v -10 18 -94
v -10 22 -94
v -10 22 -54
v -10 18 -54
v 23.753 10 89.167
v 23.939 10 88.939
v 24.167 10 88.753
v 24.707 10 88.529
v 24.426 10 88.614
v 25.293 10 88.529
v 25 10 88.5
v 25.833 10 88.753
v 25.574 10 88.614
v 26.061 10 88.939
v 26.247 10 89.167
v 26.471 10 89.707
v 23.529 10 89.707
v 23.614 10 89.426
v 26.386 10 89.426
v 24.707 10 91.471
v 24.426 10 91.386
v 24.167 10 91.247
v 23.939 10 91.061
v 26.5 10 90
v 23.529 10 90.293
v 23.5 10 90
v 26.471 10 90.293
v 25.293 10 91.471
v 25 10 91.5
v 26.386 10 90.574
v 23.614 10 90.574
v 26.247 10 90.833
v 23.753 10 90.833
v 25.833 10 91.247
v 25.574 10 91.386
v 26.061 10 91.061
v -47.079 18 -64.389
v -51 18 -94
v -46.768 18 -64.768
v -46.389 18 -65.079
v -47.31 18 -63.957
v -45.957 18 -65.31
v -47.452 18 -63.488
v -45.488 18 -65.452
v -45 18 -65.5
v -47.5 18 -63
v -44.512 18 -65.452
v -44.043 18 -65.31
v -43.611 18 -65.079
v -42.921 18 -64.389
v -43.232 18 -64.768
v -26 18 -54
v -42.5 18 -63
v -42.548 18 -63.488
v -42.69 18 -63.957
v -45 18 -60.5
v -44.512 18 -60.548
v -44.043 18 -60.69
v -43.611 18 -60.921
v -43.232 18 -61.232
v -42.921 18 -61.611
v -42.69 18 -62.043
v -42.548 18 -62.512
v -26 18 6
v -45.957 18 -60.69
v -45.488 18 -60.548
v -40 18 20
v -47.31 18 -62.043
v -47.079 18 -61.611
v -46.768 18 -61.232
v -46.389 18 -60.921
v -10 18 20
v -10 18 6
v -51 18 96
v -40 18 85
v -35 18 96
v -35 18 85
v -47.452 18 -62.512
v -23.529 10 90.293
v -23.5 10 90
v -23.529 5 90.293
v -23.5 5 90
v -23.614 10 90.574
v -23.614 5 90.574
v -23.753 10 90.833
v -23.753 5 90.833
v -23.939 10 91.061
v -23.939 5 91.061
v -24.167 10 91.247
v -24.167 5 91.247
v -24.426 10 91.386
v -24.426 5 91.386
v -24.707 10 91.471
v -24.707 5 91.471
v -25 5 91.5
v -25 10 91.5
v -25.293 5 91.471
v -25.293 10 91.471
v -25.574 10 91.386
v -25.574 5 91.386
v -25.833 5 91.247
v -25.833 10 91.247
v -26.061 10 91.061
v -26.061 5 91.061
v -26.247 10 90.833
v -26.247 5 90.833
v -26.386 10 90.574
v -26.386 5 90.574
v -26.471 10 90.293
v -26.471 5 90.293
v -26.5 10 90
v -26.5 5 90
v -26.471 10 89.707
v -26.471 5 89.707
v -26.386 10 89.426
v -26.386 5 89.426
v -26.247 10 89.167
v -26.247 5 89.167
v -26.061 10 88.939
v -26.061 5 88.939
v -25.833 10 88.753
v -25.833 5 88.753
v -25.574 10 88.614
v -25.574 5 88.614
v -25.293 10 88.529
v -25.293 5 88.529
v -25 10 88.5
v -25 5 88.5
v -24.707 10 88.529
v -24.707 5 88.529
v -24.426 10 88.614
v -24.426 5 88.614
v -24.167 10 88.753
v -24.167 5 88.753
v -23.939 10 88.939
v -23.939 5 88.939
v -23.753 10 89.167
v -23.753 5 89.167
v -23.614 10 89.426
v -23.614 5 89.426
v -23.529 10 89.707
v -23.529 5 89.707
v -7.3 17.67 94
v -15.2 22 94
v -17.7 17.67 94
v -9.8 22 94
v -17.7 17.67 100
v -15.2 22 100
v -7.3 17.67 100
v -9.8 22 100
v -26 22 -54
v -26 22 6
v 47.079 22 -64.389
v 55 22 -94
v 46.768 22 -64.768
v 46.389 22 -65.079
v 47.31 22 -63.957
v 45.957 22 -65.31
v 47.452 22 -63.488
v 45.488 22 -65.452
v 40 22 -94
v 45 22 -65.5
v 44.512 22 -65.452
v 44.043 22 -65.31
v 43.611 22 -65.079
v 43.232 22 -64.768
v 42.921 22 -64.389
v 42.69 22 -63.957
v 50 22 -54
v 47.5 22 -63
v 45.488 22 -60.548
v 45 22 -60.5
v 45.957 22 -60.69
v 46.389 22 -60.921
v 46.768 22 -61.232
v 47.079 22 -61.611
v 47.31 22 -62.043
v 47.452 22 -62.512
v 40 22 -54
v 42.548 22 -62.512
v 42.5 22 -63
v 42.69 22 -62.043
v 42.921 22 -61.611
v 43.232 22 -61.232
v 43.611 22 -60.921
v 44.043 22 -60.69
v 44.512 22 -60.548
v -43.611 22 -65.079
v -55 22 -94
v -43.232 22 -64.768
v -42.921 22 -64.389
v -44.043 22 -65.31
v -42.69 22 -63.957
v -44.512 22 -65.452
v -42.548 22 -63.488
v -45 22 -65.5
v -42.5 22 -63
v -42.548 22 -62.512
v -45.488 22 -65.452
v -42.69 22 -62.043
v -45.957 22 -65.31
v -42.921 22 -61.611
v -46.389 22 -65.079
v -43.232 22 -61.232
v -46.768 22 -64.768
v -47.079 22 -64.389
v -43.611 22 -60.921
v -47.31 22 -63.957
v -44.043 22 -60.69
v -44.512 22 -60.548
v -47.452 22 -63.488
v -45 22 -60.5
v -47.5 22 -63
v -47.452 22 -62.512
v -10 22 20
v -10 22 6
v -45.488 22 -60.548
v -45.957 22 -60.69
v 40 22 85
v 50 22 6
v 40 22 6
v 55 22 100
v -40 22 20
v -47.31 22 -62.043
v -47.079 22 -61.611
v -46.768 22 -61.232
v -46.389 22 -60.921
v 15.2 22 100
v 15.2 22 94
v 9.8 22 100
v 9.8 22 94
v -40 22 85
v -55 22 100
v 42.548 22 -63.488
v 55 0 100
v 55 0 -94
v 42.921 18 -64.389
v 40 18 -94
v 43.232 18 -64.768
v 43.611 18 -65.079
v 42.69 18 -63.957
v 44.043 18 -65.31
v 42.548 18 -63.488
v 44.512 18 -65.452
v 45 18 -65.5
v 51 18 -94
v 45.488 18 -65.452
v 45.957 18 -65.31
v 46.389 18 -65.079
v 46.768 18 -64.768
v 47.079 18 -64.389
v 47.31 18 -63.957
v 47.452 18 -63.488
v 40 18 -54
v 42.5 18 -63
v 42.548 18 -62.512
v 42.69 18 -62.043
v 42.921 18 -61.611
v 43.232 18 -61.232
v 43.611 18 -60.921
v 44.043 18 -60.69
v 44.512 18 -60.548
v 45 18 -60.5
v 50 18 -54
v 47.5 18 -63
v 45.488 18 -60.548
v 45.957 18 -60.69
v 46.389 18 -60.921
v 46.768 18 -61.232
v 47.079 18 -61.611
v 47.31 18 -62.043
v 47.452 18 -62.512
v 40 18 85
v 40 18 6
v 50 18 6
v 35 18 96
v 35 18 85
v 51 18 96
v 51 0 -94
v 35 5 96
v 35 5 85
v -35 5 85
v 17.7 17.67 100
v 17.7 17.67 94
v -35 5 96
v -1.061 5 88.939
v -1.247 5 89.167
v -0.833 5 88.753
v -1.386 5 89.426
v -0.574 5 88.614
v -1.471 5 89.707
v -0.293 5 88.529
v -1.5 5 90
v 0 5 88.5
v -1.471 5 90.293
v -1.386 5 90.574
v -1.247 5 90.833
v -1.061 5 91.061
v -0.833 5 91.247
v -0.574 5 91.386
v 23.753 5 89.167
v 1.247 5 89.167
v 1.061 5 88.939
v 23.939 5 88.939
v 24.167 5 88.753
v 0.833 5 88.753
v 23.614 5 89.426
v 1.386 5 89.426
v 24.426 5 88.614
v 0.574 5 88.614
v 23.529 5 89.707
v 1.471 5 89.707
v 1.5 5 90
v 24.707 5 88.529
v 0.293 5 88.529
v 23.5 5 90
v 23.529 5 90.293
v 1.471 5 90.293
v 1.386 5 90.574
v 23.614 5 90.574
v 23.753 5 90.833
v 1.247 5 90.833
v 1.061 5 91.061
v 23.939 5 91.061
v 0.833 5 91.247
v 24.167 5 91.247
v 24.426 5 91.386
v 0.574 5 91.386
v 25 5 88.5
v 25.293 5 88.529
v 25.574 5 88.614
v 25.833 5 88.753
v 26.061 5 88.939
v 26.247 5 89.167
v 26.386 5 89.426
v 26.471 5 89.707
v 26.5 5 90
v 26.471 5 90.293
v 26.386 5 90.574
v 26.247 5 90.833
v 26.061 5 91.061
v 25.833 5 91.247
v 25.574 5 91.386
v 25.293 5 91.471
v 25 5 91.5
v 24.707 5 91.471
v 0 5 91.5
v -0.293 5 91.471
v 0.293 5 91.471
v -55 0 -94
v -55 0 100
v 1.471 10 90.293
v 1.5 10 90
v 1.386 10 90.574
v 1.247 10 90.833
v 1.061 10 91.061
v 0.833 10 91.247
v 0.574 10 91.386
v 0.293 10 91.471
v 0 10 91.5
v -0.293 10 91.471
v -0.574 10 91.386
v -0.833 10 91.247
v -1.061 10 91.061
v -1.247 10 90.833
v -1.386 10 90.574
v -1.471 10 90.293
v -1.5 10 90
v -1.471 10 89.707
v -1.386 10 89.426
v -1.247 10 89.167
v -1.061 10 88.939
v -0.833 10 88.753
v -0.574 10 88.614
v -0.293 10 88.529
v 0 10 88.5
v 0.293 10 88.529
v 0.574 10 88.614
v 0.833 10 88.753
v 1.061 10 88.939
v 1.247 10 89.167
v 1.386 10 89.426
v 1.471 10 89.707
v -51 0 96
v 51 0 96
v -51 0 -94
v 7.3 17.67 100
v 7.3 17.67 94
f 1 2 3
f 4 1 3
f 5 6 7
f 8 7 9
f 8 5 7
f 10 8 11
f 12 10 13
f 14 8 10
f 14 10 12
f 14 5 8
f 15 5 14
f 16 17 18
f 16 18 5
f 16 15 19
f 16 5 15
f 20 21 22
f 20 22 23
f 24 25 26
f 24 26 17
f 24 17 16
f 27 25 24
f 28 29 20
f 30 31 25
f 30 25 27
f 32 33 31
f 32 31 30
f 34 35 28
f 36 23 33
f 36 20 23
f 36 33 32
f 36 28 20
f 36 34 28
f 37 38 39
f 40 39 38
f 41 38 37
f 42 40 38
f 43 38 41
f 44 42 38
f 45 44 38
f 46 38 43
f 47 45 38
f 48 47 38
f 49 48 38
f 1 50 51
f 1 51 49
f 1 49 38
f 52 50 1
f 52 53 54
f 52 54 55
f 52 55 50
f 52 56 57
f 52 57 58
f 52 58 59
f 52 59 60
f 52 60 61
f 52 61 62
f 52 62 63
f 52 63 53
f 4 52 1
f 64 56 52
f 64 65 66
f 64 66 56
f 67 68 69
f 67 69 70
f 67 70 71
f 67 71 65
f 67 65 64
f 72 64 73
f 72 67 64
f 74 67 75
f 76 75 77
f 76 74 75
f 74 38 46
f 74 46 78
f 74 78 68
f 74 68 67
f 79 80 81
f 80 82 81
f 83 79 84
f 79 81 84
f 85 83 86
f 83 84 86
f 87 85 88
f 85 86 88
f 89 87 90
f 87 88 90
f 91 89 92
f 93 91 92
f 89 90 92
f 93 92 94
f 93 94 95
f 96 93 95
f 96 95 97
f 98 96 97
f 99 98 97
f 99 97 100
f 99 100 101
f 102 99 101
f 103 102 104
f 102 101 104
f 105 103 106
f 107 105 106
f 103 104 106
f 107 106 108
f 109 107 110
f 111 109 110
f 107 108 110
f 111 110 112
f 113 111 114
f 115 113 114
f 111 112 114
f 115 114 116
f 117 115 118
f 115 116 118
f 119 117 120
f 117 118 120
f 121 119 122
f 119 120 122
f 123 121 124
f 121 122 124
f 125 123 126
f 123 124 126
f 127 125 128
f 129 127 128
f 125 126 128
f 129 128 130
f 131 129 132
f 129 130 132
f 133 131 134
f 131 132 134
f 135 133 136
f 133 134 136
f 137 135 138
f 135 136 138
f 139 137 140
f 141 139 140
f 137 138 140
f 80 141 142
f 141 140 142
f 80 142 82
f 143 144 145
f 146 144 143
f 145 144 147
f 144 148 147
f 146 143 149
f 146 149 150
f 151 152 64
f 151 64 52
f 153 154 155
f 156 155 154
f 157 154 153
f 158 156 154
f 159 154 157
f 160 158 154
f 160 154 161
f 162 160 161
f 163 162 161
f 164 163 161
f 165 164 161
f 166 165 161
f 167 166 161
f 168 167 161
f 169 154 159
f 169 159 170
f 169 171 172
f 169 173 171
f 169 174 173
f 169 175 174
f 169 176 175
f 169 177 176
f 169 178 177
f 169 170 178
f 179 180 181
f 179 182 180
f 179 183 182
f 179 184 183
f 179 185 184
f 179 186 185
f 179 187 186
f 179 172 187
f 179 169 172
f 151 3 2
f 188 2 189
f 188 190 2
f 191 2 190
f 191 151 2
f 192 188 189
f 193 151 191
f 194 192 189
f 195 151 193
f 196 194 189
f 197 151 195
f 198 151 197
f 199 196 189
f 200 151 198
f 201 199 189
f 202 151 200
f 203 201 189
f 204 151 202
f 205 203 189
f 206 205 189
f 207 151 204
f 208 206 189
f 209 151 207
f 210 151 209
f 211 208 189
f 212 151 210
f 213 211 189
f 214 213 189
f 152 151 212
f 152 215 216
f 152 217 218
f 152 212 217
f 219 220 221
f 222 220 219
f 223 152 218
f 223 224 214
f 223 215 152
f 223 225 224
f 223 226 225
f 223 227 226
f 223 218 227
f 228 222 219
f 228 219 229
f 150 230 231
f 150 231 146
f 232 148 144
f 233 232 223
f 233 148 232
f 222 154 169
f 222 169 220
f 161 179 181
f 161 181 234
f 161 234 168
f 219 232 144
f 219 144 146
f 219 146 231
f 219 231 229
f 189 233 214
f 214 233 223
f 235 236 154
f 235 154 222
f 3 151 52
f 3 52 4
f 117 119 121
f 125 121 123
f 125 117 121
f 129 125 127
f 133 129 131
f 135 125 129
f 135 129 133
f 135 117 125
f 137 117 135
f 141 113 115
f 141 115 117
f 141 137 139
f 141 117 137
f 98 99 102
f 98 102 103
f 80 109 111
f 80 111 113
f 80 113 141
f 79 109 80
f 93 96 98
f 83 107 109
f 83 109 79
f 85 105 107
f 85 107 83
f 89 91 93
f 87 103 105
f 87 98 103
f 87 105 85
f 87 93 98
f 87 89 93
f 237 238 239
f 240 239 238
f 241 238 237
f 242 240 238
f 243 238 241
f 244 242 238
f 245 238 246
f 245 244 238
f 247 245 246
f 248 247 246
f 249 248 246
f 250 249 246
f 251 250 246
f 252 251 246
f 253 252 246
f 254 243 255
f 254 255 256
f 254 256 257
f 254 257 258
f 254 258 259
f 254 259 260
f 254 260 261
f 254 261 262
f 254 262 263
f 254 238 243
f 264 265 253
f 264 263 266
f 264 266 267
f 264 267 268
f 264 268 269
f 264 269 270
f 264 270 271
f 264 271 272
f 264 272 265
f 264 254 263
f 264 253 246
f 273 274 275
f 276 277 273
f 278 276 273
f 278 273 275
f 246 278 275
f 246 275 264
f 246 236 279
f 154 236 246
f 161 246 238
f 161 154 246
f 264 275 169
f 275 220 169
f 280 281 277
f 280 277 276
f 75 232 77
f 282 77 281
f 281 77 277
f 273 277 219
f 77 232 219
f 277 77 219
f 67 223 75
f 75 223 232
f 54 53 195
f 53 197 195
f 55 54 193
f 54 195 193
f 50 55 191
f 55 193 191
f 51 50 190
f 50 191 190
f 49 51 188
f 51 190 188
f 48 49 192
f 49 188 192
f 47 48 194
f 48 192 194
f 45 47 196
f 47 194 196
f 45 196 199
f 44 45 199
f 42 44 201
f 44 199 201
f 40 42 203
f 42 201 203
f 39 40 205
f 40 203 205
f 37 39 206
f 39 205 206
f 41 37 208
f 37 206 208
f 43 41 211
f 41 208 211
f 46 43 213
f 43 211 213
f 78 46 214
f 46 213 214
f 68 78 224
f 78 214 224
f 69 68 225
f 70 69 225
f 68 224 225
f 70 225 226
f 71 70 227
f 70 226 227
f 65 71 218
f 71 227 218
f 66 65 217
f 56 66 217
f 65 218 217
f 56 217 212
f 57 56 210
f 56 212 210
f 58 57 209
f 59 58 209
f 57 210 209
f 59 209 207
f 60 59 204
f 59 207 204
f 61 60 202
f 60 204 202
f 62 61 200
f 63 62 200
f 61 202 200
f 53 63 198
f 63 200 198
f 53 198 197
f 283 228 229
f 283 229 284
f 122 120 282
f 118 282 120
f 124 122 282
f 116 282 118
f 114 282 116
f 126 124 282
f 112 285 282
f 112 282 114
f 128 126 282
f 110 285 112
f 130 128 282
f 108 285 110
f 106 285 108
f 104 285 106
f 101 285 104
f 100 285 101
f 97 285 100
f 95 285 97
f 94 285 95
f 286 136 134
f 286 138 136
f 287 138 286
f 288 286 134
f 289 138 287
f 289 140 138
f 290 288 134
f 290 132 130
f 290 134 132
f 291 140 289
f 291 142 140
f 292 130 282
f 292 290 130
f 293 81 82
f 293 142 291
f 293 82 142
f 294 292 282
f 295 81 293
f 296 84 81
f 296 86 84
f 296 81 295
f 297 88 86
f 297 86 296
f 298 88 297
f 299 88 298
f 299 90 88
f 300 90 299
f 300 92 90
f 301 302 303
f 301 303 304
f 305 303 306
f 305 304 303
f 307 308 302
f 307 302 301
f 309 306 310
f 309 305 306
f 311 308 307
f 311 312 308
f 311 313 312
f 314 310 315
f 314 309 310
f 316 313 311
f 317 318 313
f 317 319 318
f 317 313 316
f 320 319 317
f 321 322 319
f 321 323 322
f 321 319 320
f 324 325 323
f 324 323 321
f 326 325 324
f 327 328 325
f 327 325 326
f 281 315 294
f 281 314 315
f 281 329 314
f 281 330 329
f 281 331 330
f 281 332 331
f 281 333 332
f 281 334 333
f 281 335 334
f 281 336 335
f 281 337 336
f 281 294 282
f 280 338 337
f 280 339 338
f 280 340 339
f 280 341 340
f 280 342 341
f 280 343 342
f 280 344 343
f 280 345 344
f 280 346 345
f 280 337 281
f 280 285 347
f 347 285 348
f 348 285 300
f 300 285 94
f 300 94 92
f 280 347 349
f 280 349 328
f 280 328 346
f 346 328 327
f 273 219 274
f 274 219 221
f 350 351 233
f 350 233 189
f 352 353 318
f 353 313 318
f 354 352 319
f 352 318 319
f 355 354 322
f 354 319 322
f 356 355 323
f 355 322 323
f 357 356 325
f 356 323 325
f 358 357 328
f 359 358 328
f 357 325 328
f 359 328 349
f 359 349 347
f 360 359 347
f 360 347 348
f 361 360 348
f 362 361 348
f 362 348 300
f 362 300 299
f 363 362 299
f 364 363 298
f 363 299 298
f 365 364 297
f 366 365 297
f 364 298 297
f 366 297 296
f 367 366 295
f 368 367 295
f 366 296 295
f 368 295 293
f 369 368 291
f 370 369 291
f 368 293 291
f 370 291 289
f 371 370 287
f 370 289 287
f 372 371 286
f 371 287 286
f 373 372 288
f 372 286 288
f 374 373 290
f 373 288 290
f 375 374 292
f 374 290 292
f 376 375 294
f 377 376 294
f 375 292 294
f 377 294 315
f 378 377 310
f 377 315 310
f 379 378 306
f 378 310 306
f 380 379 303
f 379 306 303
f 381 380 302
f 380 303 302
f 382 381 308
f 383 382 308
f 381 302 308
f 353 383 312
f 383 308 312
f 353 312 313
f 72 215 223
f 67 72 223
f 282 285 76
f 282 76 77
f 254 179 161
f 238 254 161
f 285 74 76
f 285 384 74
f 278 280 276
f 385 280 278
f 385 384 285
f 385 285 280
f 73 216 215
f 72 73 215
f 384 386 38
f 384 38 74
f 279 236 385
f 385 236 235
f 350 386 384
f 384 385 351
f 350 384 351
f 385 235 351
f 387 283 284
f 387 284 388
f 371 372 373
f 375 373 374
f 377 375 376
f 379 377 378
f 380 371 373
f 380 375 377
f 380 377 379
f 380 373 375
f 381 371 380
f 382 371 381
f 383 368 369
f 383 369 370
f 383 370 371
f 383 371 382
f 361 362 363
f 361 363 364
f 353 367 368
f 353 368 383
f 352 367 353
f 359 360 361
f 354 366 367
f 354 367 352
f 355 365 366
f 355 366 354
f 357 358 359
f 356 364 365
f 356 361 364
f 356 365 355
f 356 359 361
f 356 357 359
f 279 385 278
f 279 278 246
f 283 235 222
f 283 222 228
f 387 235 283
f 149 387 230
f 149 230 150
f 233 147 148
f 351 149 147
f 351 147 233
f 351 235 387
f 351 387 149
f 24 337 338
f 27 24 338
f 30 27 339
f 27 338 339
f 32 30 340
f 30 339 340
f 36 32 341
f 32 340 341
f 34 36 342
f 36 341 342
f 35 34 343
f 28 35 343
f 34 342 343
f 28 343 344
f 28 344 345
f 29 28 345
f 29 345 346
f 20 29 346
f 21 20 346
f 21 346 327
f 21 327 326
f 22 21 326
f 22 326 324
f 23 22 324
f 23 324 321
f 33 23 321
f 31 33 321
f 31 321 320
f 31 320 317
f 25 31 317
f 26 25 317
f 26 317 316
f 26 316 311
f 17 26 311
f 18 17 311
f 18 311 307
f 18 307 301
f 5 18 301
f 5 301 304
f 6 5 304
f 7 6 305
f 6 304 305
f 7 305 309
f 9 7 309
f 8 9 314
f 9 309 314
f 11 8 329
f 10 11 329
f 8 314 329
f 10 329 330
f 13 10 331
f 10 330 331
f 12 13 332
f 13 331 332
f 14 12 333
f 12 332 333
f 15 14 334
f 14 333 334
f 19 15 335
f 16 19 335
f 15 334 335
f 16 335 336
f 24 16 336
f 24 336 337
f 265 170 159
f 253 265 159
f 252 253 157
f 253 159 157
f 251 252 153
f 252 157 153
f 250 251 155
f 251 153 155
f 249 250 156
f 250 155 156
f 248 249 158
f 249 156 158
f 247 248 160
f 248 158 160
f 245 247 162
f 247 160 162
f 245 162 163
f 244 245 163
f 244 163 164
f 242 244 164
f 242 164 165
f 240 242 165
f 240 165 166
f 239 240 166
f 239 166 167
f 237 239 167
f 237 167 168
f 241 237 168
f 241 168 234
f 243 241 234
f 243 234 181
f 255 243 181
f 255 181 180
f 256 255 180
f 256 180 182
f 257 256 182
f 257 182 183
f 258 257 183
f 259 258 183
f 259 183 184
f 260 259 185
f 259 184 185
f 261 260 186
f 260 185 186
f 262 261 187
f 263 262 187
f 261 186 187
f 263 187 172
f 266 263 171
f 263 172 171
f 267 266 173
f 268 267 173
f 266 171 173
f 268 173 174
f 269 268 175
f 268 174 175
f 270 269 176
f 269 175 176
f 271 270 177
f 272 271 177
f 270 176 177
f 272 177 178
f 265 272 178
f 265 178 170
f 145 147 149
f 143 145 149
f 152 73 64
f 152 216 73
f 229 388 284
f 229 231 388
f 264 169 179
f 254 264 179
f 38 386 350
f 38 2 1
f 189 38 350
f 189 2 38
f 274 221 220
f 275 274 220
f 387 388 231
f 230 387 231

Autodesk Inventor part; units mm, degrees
ref_plane "YZ Plane" through (0, 0, 0) normal (1, 0, 0) x (0, 1, 0)
ref_plane "XZ Plane" through (0, 0, 0) normal (0, 1, 0) x (-1, 0, 0)
ref_plane "XY Plane" through (0, 0, 0) normal (0, 0, 1) x (1, 0, 0)
sketch "Sketch1" plane through (0, 0, 0) normal (0, 1, 0) x (-1, 0, 0)
  line L0 (-55, 100) -> (55, 100)
  line L1 (55, 100) -> (55, -100)
  line L2 (55, -100) -> (-55, -100)
  line L3 (-55, -100) -> (-55, 100)
  line L4 (-55, 100) -> (55, -100) construction
  line L5 (55, 100) -> (-55, -100) construction
  point P0 (0, 0)
  dimension "d0" = 110
  dimension "d1" = 200
extrude "Extrusion1" add sketch "Sketch1" along normal blind 22
sketch "Sketch2" plane through (0, 22, 0) normal (0, 1, 0) x (1, 0, 0)
  line L0 (55, -100) -> (55, 100) construction
  line L1 (55, 100) -> (40, 100) construction
  line L2 (55, 100) -> (-55, 100) construction
  line L3 (55, 100) -> (70, 100) construction
  line L4 (40, 100) -> (-10, 100)
  line L5 (-10, 100) -> (-10, -20)
  line L6 (-10, -20) -> (40, -20)
  line L7 (40, -20) -> (40, 100)
  point P0 (0, 0)
  dimension "d4" = 15
  dimension "d5" = 180
  dimension "d6" = 50
  dimension "d7" = 120
sketch "Sketch3" plane through (0, 0, 0) normal (0, -1, 0) x (1, 0, 0)
  line L0 (-51, 96) -> (51, 96)
  line L1 (51, 96) -> (51, -96)
  line L2 (51, -96) -> (-51, -96)
  line L3 (-51, -96) -> (-51, 96)
  line L4 (-51, 96) -> (51, -96) construction
  line L5 (51, 96) -> (-51, -96) construction
  point P0 (0, 0)
  dimension "d8" = 102
  dimension "d9" = 192
extrude "Extrusion2" cut sketch "Sketch3" against normal blind 18
extrude "Extrusion3" cut sketch "Sketch2" against normal up to surface (22 mm away)
sketch "Sketch4" plane through (0, 22, 0) normal (0, 1, 0) x (1, 0, 0)
  line L0 (40, -20) -> (-10, -20) projected
  line L1 (40, -20) -> (-40, -20)
  line L2 (-40, -20) -> (-40, -85)
  line L3 (-40, -85) -> (40, -85)
  line L4 (40, -85) -> (40, -20)
  point P0 (0, 0)
  dimension "d14" = 80
  dimension "d15" = 65
extrude "Extrusion4" cut sketch "Sketch4" against normal blind 13
sketch "Sketch6" plane through (0, 22, 0) normal (0, 1, 0) x (1, 0, 0)
  line L0 (40, 100) -> (40, -85) projected
  line L1 (40, -85) -> (-40, -85) projected
  line L2 (-40, -85) -> (-40, -20) projected
  line L3 (-40, -20) -> (-10, -20) projected
  line L4 (-10, -20) -> (-10, 100) projected
  line L5 (-10, 100) -> (-55, 100) projected
  line L6 (-55, 100) -> (-55, -100) projected
  line L7 (-55, -100) -> (55, -100) projected
  line L8 (55, -100) -> (55, 100) projected
  line L9 (55, 100) -> (40, 100) projected
  line L10 (-55, 100) -> (-55, 63) construction
  line L11 (-55, 100) -> (-18, 100) construction
  line L12 (-55, 63) -> (-45, 63) construction
  circle A0 centre (-45, 63) radius 2.5
  line L13 (55, 100) -> (55, -100) construction
  line L14 (55, 100) -> (55, 63) construction
  line L15 (55, 100) -> (92, 100) construction
  line L16 (55, 63) -> (45, 63) construction
  circle A1 centre (45, 63) radius 2.5
  point P0 (0, 0)
  dimension "d24" = 37
  dimension "d25" = 90
  dimension "d26" = 10
  dimension "d27" = 90
  dimension "d28" = 5
  dimension "d29" = 37
  dimension "d30" = 90
  dimension "d31" = 10
  dimension "d32" = 90
  dimension "d33" = 5
extrude "Extrusion6" cut sketch "Sketch6" against normal blind 10 contours A0 | A1
sketch "Sketch8" plane through (0, 18, 0) normal (0, -1, 0) x (1, 0, 0)
  line L0 (51, 96) -> (51, -96) construction
  line L1 (51, 96) -> (35, 96) construction
  line L2 (-51, 96) -> (51, 96) construction
  line L3 (51, 96) -> (67, 96) construction
  line L4 (35, 96) -> (-35, 96)
  line L5 (-35, 96) -> (-35, 85)
  line L6 (-35, 85) -> (35, 85)
  line L7 (35, 85) -> (35, 96)
  point P0 (0, 0)
  dimension "d57" = 16
  dimension "d58" = 180
  dimension "d59" = 70
  dimension "d60" = 11
extrude "Extrusion8" add sketch "Sketch8" along normal blind 13
sketch "Sketch7" plane through (-55, 0, 100) normal (0, 0, 1) x (1, 0, 0)
  line L0 (45, 22) -> (0, 22) construction
  line L1 (0, 22) -> (39.8, 22) construction
  line L2 (39.8, 22) -> (37.3, 17.6699)
  line L3 (39.8, 22) -> (44.8, 22) construction
  line L4 (37.3, 17.6699) -> (47.7, 17.6699)
  line L5 (45, 18) -> (4, 18) projected
  line L6 (47.7, 17.6699) -> (45.2, 22)
  line L7 (15, 22) -> (45, 22) projected
  line L8 (45.2, 22) -> (39.8, 22)
  line L9 (0, 22) -> (110, 22) projected
  line L10 (110, 22) -> (70.2, 22)
  line L11 (110, 22) -> (149.8, 22) construction
  line L12 (70.2, 22) -> (72.7, 17.6699)
  line L13 (72.7, 17.6699) -> (62.3, 17.6699)
  line L14 (15, 18) -> (95, 18) projected
  line L15 (62.3, 17.6699) -> (64.8, 22)
  line L16 (64.8, 22) -> (70.2, 22)
  point P0 (55, 0)
  dimension "d36" = 39.8
  dimension "d39" = 5
  dimension "d40" = 120
  dimension "d41" = 10.4
  dimension "d42" = 60
  dimension "d43" = 5
  dimension "d44" = 60
  dimension "d45" = 5.4
  dimension "d46" = 120
  dimension "d47" = 39.8
  dimension "d48" = 180
  dimension "d49" = 5
  dimension "d50" = 60
  dimension "d51" = 10.4
  dimension "d52" = 60
  dimension "d53" = 5
  dimension "d54" = 60
extrude "Extrusion7" cut sketch "Sketch7" against normal blind 6 contours L7 L8 L6 L14 L5 L2 | L5 L14 L6 L4 L2 | L9 L12 L14 L15 | L14 L12 L13 L15
sketch "Sketch9" plane through (0, 0, 0) normal (0, -1, 0) x (1, 0, 0)
  line L0 (-10, -100) -> (-10, -96) projected
  line L1 (-10, -96) -> (-51, -96) projected
  line L2 (-51, -96) -> (-51, 96) projected
  line L3 (-51, 96) -> (51, 96) projected
  line L4 (51, 96) -> (51, -96) projected
  line L5 (51, -96) -> (40, -96) projected
  line L6 (40, -96) -> (40, -100) projected
  line L7 (40, -100) -> (55, -100) projected
  line L8 (55, -100) -> (55, 100) projected
  line L9 (55, 100) -> (-55, 100) projected
  line L10 (-55, 100) -> (-55, -100) projected
  line L11 (-55, -100) -> (-10, -100) projected
  line L12 (55, 100) -> (-55, 100) projected
  line L13 (0, 100) -> (0, 90)
  line L14 (0, 100) -> (10, 100) construction
  line L15 (0, 90) -> (-25, 90)
  line L16 (0, 90) -> (25, 90)
  circle A0 centre (25, 90) radius 1.5
  circle A1 centre (0, 90) radius 1.5
  circle A2 centre (-25, 90) radius 1.5
  point P0 (0, 0)
  dimension "d63" = 10
  dimension "d64" = 90
  dimension "d65" = 25
  dimension "d66" = 180
  dimension "d67" = 3
  dimension "d68" = 3
  dimension "d69" = 3
extrude "Extrusion9" cut sketch "Sketch9" against normal blind 10 contours A0 | A2 | A1 L16 L13 | L13 L15 A1 | L16 A1 L15
sketch "Sketch10" plane through (-55, 0, -100) normal (0, 0, -1) x (-1, 0, 0)
  line L0 (-45, 22) -> (-45, 0) projected
  line L1 (0, 0) -> (-45, 0) projected
  line L2 (0, 0) -> (0, 22) projected
  line L3 (-45, 22) -> (0, 22) projected
  line L4 (-95, 0) -> (-95, 22) projected
  line L5 (-110, 22) -> (-95, 22) projected
  line L6 (-110, 0) -> (-110, 22) projected
  line L7 (-95, 0) -> (-110, 0) projected
  line L8 (0, 0) -> (-110, 0)
  line L9 (-110, 0) -> (-110, 22)
  line L10 (-110, 22) -> (0, 22)
  line L11 (0, 22) -> (0, 0)
  point P0 (-55, 0)
extrude "Extrusion11" cut sketch "Sketch10" against normal blind 6 contours L3 L2 L1 L0 | L4 L7 L6 L5
sketch "Sketch11" plane through (0, 22, 0) normal (0, 1, 0) x (1, 0, 0)
  line L0 (-10, -20) -> (-40, -20) construction
  line L1 (-10, -20) -> (-10, -6) construction
  line L2 (-10, 94) -> (-10, -20) construction
  line L3 (-10, -6) -> (-26, -6)
  line L4 (-26, -6) -> (-26, 54)
  line L5 (-26, 54) -> (-10, 54)
  line L6 (-10, 54) -> (-10, -6)
  line L7 (-10, -6) -> (40, -6) construction
  line L8 (40, -85) -> (40, 94) construction
  line L9 (40, -6) -> (50, -6)
  line L10 (50, -6) -> (50, 54)
  line L11 (50, 54) -> (40, 54)
  line L12 (40, 54) -> (40, -6)
  point P0 (0, 0)
  dimension "d77" = 14
  dimension "d78" = 16
  dimension "d79" = 60
  dimension "d80" = 10
  dimension "d81" = 60
extrude "Extrusion12" cut sketch "Sketch11" against normal up to surface (4 mm away)
ref_plane "Work Plane1" through (0, 0, 100) normal (1, 0, 0) x (0, 0, -1)
properties part number "foot_cover_2_bottom"
